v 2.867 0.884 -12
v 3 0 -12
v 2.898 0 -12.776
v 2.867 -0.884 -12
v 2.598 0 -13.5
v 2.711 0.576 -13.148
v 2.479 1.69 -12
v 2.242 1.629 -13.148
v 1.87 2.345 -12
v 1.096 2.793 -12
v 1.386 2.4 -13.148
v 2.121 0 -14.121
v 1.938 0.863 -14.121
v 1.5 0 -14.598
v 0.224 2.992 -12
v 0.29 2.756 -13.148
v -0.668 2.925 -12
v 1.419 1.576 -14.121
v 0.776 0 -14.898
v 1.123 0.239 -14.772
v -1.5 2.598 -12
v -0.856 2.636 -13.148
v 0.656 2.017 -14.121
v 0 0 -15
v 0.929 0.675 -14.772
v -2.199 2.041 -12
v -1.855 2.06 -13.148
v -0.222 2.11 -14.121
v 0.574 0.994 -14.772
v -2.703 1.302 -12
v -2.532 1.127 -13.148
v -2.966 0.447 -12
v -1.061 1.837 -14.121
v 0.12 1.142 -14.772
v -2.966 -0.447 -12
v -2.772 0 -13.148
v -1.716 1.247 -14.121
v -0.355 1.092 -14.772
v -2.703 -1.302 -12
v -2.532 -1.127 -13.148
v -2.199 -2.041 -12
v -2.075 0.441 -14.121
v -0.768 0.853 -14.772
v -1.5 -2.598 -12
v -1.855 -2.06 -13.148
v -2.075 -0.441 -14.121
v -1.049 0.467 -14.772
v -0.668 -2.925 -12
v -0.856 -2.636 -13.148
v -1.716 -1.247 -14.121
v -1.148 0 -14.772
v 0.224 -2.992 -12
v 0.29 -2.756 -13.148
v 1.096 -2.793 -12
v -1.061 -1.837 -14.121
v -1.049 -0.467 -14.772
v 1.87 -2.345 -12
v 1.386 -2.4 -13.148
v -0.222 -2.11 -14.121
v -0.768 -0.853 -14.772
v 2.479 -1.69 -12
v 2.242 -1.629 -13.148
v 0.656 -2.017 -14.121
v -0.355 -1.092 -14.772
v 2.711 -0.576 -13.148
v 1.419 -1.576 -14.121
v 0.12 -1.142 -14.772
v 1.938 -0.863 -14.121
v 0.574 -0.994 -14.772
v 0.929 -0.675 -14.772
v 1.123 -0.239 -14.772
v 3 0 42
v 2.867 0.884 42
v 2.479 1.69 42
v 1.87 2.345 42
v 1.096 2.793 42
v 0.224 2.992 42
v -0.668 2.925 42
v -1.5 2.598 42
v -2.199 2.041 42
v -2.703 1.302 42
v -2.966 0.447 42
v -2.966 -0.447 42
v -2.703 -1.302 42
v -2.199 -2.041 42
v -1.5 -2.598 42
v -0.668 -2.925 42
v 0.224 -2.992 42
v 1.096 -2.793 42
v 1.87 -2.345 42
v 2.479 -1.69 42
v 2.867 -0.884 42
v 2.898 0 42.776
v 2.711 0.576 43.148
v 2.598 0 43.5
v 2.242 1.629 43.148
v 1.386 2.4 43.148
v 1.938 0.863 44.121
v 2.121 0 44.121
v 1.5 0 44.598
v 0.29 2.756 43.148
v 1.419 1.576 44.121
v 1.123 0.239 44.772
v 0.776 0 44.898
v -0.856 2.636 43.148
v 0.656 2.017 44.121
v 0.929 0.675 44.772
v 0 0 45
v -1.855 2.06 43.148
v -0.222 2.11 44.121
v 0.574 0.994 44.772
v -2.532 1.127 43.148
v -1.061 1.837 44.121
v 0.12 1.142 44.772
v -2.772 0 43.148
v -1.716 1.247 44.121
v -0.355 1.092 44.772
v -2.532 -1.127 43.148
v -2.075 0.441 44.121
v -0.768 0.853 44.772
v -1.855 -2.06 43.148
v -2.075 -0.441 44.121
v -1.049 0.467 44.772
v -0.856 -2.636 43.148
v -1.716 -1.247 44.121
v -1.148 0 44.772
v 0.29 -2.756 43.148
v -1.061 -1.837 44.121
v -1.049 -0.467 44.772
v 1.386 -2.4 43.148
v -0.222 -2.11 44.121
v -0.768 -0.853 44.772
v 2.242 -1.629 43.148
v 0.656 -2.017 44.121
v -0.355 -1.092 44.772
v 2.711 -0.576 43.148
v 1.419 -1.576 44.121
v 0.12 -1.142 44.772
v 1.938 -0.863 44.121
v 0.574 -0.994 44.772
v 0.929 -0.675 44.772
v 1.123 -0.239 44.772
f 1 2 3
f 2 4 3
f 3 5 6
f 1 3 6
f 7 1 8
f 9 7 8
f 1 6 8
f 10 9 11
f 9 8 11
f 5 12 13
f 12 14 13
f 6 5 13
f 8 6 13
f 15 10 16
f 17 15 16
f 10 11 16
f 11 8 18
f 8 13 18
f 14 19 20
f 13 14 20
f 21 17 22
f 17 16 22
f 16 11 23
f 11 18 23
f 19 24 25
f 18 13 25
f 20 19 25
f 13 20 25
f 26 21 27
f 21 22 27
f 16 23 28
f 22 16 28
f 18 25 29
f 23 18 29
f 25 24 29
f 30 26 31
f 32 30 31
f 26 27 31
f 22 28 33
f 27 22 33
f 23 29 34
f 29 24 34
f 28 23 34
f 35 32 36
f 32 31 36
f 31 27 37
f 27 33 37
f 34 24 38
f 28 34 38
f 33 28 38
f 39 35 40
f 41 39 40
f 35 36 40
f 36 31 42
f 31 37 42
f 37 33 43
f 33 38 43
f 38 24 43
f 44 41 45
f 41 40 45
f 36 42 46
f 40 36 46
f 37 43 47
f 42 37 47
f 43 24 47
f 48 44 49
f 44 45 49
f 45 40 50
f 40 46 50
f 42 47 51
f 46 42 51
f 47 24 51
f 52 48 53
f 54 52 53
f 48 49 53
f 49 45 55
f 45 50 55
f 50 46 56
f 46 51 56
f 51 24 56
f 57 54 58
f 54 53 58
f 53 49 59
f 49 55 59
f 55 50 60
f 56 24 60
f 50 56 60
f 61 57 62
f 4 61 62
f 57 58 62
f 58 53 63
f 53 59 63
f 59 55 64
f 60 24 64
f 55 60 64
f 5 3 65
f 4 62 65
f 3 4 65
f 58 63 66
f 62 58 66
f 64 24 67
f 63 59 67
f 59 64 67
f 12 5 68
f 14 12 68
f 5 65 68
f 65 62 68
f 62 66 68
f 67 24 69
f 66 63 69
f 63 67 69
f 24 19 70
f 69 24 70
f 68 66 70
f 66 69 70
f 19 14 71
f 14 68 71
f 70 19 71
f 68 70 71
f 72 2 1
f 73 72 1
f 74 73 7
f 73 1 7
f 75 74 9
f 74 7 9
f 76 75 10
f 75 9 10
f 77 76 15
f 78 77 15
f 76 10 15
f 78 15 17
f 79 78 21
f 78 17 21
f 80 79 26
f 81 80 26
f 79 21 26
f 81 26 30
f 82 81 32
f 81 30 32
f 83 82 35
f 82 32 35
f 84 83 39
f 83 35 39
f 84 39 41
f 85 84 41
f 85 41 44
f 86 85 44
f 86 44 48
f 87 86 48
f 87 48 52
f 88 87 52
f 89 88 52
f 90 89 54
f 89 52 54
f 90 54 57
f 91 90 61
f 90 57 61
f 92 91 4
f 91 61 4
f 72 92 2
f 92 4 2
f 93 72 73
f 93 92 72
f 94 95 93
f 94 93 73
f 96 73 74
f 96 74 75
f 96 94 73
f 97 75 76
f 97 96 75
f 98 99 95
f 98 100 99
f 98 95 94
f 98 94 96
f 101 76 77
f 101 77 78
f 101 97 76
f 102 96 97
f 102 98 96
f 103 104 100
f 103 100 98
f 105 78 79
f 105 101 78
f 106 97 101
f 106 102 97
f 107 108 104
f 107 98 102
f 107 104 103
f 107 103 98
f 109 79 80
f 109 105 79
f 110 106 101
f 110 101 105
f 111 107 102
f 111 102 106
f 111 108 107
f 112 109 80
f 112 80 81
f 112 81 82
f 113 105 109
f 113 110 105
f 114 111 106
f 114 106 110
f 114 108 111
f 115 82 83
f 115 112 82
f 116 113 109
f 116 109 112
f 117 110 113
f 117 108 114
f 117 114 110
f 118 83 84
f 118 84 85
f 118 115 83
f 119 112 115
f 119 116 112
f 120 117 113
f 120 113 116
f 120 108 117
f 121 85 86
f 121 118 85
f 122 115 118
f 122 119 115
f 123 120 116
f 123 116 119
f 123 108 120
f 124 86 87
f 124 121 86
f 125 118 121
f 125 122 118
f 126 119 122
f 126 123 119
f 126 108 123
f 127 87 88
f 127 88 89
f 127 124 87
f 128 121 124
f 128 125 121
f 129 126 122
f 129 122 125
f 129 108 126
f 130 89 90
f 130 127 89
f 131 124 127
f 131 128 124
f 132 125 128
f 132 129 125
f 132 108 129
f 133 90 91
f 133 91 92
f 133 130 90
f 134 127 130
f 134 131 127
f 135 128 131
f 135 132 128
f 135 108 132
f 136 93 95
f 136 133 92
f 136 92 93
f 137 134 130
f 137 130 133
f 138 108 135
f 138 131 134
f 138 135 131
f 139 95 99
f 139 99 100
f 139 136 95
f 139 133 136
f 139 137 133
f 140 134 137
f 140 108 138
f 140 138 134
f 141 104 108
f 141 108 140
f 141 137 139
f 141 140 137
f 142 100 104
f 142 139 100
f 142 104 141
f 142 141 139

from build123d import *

# Parameters (mm, degrees)
SKETCH1_R           = 1.5
BOSS_EXTRUDE1_DEPTH = 30
FILLET1_R           = 1.5
SCALE1_SCALE        = 2


with BuildPart() as part:
    # Sketch1 → Boss-Extrude1 (new body)
    with BuildSketch(Plane.XY):
        Circle(SKETCH1_R)
    extrude(amount=BOSS_EXTRUDE1_DEPTH)

    # Fillet1
    fillet1_edges = [part.edges().sort_by_distance(p)[0] for p in [
        (-1.5, 0, 0),
        (-1.5, 0, 30),
    ]]
    fillet(fillet1_edges, radius=FILLET1_R)


with BuildPart() as part_1:
    # Scale1: scaled about (0, 0, 15)
    add(part.part.scale(SCALE1_SCALE).moved(Location((0, 0, -15))))


solid = part_1.part
